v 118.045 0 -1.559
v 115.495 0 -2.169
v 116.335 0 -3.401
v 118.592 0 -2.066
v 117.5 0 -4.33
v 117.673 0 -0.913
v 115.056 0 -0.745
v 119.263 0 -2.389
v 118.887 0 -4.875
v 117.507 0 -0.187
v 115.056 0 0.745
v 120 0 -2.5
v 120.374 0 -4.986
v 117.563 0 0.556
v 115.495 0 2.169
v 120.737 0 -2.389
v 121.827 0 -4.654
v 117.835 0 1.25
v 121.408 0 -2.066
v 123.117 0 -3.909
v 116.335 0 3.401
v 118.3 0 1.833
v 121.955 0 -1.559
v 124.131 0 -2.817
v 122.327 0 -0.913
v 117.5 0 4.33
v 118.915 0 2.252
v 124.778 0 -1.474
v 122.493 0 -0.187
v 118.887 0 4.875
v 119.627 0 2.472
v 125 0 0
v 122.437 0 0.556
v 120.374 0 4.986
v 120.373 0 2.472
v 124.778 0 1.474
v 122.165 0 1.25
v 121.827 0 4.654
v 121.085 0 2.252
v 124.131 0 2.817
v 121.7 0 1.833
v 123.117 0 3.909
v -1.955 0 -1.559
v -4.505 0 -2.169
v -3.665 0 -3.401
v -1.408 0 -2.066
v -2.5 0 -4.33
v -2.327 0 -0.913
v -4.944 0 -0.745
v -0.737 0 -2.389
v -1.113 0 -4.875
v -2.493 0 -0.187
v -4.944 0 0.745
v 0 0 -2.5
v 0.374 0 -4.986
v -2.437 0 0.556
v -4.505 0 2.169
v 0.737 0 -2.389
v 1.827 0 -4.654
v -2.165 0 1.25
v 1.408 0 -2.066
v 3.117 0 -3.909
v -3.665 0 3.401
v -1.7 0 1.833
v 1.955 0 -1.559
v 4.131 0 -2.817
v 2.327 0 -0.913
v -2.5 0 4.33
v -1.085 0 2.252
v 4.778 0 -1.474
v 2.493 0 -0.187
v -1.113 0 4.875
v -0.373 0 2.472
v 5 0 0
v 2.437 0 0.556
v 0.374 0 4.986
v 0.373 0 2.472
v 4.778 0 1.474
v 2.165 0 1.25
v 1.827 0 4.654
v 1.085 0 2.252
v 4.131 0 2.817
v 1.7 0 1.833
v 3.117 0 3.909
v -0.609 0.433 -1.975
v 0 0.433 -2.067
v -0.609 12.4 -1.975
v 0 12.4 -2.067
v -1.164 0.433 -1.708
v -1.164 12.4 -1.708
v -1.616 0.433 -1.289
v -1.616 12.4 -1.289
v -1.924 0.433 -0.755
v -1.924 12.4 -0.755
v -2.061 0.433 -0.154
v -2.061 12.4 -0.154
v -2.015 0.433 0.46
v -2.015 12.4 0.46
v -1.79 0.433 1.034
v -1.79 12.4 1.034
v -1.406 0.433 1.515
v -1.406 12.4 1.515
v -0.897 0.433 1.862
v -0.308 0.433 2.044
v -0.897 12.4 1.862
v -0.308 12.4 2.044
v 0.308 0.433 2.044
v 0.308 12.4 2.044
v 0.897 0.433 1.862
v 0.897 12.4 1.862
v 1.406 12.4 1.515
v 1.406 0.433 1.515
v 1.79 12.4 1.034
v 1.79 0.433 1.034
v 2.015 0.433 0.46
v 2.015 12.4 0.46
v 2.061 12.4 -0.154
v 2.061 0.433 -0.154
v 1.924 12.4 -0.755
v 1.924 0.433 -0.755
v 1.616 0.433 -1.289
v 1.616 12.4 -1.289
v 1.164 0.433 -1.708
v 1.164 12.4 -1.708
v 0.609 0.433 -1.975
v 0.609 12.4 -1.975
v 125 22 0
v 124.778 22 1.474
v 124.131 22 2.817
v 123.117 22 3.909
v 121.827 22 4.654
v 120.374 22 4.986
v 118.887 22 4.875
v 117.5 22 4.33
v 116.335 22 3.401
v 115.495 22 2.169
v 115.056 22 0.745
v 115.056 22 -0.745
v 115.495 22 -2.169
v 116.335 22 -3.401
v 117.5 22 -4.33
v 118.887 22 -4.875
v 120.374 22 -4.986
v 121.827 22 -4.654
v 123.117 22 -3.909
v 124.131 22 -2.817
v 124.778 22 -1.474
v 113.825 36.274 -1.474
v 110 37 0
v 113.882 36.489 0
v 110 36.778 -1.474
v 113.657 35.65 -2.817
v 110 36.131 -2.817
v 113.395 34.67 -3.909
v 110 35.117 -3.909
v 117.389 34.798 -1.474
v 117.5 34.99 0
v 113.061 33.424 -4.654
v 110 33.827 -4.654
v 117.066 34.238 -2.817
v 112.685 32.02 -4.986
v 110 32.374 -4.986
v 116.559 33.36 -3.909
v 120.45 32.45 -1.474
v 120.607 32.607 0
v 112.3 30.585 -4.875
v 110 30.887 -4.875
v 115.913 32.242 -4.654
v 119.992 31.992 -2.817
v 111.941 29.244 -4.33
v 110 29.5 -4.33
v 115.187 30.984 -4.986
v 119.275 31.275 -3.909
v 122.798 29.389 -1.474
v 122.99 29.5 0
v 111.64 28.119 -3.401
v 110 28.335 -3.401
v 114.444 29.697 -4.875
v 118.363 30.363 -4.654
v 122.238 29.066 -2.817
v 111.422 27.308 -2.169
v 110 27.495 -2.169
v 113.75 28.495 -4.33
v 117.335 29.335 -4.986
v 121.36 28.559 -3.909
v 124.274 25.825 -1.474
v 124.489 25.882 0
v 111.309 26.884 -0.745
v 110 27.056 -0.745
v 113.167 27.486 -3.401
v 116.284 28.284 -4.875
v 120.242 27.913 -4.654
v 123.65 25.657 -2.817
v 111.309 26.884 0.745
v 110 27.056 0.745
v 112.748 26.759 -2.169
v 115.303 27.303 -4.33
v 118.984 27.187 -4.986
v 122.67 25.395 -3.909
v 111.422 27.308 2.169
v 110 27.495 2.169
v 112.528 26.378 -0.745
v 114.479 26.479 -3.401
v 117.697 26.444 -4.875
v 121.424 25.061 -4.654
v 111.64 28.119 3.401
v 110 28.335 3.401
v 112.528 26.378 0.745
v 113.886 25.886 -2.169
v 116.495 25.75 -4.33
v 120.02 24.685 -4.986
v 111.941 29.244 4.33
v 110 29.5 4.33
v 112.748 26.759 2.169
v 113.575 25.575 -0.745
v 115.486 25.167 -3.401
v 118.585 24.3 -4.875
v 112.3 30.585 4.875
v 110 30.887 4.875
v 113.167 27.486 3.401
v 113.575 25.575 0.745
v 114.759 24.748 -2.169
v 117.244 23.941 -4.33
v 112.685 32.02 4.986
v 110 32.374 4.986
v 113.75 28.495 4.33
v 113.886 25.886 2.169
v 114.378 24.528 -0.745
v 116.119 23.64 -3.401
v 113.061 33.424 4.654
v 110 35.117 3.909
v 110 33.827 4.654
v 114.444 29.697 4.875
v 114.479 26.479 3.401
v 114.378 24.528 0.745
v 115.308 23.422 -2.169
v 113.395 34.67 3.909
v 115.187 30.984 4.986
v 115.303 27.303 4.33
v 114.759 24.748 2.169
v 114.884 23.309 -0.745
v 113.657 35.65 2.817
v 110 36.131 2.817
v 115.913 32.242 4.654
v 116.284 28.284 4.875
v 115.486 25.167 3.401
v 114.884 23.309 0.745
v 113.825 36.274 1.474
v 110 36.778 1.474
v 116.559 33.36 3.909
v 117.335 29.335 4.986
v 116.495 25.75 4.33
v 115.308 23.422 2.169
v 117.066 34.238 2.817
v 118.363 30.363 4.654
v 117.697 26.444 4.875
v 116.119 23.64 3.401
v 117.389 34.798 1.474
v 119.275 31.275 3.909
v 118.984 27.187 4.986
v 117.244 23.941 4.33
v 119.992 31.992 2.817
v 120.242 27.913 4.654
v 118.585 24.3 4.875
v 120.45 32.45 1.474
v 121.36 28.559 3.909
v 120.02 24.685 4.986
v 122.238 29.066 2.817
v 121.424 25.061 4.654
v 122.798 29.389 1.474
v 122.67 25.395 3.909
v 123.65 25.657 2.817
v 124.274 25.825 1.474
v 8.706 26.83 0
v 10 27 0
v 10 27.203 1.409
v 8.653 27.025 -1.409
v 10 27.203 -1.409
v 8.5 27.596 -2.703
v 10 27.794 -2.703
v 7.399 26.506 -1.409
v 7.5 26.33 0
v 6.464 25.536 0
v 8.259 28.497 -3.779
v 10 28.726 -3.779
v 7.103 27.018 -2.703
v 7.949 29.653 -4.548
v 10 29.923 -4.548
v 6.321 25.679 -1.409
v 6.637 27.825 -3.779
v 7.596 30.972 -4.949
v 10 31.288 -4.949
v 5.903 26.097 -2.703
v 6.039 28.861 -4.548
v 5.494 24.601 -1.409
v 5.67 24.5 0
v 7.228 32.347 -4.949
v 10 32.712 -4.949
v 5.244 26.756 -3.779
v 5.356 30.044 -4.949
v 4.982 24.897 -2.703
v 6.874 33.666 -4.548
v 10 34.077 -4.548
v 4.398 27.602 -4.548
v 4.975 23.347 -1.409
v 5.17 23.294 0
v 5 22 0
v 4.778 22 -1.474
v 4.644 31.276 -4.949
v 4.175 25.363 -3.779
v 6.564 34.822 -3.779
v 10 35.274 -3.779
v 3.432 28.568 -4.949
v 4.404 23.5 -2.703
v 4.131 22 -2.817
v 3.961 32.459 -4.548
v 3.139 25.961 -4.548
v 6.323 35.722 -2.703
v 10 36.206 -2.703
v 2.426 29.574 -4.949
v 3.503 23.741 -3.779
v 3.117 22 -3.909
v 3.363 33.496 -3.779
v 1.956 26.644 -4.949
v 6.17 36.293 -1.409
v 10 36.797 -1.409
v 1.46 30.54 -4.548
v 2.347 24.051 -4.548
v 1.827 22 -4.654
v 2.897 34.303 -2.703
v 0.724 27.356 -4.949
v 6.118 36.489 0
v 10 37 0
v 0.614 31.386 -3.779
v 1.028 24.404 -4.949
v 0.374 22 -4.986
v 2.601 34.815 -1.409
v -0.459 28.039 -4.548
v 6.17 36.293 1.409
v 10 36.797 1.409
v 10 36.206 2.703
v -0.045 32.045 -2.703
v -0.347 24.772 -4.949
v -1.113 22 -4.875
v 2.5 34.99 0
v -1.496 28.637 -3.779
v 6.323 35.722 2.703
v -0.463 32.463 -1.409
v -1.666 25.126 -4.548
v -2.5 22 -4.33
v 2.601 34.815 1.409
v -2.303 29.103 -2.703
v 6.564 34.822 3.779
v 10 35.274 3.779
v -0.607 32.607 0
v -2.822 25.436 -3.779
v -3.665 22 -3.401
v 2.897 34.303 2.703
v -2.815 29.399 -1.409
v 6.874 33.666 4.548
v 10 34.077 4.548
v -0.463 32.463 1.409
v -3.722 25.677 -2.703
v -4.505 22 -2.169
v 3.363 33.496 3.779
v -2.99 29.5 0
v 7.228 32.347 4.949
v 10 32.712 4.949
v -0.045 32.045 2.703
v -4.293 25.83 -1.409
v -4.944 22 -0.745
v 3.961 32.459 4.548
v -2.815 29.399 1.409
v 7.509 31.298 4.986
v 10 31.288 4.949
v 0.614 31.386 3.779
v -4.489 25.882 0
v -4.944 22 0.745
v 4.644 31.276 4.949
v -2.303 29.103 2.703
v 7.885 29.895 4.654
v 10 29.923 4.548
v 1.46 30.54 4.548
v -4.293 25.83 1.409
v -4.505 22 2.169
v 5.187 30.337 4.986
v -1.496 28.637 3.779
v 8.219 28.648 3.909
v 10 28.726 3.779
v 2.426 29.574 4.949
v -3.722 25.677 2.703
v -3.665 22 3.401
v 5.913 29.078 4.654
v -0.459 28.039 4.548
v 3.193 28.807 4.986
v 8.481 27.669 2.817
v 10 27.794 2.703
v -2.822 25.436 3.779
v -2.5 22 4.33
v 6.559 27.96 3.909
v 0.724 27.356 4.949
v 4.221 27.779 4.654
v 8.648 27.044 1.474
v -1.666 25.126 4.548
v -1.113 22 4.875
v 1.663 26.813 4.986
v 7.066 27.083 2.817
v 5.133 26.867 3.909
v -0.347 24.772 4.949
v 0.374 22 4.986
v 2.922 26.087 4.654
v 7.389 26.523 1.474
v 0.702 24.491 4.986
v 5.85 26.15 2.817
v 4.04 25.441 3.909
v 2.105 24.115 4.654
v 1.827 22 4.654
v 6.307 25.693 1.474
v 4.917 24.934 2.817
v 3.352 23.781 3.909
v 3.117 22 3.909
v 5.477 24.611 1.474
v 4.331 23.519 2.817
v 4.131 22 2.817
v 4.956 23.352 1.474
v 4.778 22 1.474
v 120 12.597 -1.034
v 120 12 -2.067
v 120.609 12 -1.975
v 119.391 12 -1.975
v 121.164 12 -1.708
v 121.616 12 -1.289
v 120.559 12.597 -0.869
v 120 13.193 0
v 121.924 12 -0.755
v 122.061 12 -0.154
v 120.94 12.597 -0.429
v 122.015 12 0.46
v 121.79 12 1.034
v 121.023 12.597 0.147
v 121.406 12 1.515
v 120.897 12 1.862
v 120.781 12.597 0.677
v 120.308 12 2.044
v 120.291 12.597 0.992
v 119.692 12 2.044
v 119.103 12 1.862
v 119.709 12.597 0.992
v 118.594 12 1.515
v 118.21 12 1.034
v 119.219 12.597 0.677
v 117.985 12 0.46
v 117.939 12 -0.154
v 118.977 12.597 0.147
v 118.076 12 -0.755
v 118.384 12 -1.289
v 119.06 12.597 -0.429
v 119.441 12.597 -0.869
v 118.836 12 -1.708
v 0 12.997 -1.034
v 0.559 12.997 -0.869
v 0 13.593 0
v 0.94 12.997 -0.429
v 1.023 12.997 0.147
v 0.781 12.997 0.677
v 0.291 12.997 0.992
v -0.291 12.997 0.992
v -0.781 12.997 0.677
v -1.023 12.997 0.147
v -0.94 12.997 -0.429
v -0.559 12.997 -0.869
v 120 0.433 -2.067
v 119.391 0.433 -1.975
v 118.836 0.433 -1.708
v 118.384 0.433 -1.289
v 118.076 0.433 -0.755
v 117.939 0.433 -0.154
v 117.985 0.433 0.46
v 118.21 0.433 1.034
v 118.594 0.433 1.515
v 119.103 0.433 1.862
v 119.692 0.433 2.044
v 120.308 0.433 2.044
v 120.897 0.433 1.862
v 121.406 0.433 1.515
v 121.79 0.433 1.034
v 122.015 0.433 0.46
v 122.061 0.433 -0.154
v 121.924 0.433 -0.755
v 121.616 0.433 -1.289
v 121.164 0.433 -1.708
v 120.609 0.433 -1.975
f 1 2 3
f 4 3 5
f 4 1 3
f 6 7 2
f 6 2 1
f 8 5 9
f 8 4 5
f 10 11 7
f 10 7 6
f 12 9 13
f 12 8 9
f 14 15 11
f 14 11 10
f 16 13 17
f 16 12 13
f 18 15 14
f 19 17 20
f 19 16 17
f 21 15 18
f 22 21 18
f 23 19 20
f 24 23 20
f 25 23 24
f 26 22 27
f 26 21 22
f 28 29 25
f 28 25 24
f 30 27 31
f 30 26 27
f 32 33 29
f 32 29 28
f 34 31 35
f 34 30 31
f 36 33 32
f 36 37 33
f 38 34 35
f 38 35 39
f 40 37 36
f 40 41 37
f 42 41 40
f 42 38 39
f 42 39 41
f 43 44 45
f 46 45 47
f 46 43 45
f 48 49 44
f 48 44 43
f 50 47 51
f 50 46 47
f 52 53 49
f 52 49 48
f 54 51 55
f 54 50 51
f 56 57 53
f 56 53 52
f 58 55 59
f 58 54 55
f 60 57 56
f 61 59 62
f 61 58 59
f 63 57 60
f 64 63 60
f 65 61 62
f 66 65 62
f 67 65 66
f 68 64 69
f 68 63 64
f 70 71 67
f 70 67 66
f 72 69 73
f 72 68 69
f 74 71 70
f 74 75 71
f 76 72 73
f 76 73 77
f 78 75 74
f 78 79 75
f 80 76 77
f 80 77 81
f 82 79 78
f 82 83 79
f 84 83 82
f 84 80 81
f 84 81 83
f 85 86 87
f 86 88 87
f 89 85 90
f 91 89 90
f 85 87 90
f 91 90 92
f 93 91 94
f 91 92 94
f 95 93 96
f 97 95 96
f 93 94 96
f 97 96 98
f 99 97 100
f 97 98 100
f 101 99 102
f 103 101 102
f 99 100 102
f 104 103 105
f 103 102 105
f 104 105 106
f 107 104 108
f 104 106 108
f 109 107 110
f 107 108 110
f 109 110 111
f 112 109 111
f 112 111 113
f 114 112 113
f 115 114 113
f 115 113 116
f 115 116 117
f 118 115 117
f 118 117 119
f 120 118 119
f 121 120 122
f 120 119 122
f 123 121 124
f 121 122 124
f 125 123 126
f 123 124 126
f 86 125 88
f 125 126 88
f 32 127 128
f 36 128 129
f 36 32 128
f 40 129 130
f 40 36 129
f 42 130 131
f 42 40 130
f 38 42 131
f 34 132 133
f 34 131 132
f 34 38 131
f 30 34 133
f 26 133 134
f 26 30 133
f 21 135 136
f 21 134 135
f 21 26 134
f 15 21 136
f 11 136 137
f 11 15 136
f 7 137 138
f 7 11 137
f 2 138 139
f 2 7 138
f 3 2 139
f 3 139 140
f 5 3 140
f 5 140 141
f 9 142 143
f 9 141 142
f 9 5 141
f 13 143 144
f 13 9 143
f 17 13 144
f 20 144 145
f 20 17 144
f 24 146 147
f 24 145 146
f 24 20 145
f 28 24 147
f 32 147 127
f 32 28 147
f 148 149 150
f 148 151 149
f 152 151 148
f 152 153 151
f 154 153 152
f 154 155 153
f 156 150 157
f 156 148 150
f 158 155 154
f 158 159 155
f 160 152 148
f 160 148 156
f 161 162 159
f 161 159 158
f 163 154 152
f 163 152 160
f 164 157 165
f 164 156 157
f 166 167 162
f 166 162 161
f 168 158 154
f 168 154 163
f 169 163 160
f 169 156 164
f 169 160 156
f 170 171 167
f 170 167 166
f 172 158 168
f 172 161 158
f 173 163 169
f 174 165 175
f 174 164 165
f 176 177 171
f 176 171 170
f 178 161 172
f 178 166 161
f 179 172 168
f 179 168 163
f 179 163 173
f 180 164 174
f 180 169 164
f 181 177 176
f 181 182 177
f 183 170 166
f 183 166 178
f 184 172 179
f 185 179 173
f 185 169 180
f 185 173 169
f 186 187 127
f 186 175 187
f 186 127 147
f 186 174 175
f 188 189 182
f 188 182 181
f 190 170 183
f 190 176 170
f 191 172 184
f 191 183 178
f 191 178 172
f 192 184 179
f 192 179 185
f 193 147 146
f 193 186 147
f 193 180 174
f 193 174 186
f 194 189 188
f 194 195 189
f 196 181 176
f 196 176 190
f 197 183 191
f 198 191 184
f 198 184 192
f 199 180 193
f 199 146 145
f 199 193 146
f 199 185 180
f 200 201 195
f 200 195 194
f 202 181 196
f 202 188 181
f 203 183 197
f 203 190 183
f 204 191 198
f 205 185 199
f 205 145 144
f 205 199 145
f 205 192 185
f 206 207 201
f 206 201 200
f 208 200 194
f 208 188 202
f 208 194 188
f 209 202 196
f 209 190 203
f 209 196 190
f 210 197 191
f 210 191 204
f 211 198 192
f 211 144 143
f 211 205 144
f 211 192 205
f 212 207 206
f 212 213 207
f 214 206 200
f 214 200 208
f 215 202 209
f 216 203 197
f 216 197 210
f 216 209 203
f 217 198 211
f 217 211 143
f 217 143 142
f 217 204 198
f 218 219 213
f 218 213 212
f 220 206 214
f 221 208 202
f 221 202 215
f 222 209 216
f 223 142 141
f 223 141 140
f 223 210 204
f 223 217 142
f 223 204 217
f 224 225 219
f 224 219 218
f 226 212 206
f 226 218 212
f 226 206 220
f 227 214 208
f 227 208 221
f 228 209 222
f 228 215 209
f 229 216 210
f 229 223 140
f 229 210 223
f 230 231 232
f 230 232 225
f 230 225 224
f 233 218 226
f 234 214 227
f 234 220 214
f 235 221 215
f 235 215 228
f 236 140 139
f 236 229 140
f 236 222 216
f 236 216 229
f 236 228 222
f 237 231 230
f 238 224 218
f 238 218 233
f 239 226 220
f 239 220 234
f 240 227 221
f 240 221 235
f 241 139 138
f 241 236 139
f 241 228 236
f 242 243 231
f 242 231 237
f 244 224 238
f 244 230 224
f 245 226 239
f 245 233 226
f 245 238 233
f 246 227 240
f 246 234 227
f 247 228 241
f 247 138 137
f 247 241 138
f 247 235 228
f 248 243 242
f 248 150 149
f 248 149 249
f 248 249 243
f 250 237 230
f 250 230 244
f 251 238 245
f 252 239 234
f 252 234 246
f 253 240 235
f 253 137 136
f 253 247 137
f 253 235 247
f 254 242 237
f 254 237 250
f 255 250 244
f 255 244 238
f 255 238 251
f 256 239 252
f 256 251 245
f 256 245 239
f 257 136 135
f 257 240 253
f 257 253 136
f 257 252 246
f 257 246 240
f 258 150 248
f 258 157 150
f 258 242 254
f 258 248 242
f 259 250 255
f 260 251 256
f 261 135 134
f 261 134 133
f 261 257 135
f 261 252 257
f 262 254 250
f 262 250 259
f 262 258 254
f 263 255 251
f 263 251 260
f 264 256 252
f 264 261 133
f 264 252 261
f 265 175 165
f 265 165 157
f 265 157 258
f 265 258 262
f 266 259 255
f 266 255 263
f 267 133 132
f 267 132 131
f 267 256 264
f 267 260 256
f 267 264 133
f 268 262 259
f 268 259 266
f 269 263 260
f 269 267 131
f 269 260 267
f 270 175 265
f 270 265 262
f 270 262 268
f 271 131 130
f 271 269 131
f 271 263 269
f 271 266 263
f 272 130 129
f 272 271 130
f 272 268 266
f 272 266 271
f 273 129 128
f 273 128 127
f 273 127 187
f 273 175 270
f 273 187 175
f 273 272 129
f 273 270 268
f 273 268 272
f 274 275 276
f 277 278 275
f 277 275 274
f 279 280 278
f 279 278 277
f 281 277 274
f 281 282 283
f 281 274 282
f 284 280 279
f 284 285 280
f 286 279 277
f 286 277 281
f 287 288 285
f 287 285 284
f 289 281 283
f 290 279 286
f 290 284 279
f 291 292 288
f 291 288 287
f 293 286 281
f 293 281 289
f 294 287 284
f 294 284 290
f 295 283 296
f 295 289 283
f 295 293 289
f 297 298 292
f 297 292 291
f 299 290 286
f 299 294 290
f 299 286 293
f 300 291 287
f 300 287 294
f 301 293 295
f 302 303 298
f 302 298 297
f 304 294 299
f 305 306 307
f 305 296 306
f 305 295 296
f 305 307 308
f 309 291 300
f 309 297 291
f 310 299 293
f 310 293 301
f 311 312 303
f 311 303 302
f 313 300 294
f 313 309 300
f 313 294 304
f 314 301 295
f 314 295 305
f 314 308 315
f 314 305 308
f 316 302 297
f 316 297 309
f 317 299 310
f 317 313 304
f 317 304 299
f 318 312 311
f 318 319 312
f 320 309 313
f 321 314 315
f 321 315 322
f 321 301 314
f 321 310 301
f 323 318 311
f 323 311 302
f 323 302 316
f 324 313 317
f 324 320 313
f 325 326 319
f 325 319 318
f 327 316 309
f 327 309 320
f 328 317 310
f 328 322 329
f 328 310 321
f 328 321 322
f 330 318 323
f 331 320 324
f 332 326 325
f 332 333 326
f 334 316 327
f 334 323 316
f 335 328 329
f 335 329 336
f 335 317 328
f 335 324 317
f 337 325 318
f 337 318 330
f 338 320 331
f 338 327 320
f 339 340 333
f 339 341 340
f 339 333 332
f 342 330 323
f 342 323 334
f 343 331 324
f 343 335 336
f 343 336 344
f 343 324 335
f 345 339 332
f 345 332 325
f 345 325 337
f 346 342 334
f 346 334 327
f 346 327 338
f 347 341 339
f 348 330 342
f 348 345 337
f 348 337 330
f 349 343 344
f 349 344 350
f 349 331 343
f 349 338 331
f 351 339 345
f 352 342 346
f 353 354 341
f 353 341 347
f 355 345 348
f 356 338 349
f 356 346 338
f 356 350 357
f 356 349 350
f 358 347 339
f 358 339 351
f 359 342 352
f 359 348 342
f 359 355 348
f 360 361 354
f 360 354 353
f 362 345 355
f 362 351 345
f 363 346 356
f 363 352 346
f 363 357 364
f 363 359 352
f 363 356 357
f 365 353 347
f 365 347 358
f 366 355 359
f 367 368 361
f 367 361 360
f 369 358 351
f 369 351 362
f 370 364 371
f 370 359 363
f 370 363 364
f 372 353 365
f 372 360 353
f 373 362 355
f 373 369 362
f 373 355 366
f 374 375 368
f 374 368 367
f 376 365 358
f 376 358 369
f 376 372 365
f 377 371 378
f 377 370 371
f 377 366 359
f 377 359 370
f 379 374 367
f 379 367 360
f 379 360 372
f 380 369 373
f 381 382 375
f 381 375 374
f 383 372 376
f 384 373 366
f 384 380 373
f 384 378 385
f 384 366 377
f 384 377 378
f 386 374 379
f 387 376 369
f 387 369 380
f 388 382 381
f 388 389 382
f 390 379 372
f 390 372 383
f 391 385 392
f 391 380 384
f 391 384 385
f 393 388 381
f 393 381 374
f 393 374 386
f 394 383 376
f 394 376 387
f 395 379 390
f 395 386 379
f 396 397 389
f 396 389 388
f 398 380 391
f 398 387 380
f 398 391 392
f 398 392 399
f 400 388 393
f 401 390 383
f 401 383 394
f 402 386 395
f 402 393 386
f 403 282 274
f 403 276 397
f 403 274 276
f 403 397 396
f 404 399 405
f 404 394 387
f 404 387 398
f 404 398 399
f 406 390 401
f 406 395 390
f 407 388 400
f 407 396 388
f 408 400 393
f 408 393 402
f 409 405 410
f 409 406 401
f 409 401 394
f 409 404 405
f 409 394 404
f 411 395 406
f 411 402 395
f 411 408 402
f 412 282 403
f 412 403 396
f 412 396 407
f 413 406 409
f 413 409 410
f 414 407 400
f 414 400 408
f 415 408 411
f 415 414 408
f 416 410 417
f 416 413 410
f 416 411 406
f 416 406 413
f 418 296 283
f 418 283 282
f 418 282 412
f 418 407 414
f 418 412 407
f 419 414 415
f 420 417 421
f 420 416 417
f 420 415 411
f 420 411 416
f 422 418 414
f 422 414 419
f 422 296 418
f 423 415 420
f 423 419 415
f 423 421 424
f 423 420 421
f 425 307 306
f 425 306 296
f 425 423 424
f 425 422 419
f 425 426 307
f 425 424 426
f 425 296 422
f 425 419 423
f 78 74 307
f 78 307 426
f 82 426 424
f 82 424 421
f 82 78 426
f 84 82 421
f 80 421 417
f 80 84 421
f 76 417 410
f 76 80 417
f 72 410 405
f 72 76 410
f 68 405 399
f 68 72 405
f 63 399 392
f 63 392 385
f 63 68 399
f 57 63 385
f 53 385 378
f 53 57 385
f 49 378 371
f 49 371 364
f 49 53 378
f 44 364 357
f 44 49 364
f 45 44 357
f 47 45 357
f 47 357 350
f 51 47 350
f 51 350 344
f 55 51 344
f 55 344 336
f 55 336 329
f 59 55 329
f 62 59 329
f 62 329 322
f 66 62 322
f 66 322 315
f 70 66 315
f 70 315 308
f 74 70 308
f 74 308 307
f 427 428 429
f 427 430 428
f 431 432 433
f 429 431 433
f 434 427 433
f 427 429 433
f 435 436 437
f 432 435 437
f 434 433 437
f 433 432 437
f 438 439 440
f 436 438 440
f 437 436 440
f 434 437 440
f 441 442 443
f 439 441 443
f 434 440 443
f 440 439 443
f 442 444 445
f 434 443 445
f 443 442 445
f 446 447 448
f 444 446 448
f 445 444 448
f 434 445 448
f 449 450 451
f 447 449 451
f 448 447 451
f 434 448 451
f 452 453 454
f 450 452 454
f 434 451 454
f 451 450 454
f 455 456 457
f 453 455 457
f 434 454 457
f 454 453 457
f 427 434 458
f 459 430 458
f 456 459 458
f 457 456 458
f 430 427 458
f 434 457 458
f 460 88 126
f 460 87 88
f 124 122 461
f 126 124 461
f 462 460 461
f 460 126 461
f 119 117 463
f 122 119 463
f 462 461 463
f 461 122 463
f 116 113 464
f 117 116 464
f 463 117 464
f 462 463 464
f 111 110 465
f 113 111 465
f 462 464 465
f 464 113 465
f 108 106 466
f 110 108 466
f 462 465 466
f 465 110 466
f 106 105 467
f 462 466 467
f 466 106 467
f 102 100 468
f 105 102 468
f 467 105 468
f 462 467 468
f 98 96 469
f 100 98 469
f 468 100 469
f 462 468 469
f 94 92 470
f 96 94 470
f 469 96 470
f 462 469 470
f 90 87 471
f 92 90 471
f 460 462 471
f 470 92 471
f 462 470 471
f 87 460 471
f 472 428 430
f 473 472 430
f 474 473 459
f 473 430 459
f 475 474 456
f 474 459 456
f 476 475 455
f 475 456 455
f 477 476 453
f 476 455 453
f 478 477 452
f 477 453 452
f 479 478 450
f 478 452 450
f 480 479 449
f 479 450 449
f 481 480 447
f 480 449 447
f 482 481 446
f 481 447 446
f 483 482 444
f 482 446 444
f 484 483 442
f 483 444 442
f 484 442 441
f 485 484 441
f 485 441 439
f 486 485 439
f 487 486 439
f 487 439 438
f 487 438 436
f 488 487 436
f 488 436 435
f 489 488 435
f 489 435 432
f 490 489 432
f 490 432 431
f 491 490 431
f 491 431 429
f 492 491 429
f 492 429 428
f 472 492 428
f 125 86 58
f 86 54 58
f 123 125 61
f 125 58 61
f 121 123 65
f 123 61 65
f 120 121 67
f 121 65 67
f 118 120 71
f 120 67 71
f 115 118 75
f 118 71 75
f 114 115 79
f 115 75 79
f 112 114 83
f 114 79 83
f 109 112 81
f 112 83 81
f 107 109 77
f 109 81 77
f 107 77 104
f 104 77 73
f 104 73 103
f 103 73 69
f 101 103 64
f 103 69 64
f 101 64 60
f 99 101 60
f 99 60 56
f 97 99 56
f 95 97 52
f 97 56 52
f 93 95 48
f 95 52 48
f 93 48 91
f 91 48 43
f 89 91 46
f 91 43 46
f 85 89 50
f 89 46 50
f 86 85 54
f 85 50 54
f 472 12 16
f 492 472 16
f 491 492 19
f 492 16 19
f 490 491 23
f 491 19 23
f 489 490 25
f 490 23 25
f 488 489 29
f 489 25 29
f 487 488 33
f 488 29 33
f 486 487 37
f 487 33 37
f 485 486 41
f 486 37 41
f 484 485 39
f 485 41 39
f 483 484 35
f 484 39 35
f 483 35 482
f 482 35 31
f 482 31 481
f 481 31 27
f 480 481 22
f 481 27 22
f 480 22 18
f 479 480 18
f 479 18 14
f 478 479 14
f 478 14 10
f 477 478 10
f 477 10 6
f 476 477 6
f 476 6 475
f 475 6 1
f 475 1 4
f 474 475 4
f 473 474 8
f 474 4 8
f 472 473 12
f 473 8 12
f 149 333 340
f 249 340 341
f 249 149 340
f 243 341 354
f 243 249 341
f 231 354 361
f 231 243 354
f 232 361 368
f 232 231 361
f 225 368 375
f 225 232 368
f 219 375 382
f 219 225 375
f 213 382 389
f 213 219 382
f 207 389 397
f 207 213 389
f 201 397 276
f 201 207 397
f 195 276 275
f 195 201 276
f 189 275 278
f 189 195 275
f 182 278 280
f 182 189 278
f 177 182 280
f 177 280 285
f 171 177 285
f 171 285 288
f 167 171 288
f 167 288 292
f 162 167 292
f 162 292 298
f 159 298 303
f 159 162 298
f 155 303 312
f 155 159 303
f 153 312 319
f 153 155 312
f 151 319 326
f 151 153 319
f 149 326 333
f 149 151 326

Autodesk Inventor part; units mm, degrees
sketch "Sketch_1" plane through (0, 0, 0) normal (0, 0, 1) x (1, 0, 0)
  line L0 (0, 0) -> (0, 22)
  line L1 (0, 22) -> (5, 22)
  line L2 (5, 22) -> (5, 0)
  line L3 (5, 0) -> (0, 0)
  line L4 (0, 0) -> (0, 22)
revolve "Revolution1" add sketch "Sketch_1" angle 360 about axis through (0, 0, 0) along (0, -1, 0)
sketch "Sketch_2" plane through (0, 22, 0) normal (0, 1, 0) x (1, 0, 0)
  line L0 (10, 10) -> (10, -10)
  circle A0 centre (0, 0) radius 5
revolve "Revolution2" add sketch "Sketch_2" angle 90 about axis through (10, 22, -10) along (0, 0, -1)
sketch "Sketch3" plane through (0, 0, 0) normal (0, -1, 0) x (1, 0, 0)
  point P0 (0, 0)
hole "Hole1" at (0, 0, 0) direction (0, 1, 0) diameter 4.134 depth 12.4 tip angle 120 countersink diameter 5 countersink angle 90 thread size "M5x0.8" class "6H" standard "ISO Metric profile"
sketch "Sketch_4" plane through (0, 0, 0) normal (0, 0, 1) x (1, 0, 0)
  line L0 (110, 32) -> (10, 32)
  line L1 (10, 32) -> (10, 37)
  line L2 (10, 37) -> (110, 37)
  line L3 (110, 37) -> (110, 32)
  line L4 (110, 32) -> (10, 32)
revolve "Revolution3" add sketch "Sketch_4" angle 360 about axis through (110, 32, 0) along (1, 0, 0)
sketch "Sketch_6" plane through (0, 22, 0) normal (0, 1, 0) x (1, 0, 0)
  line L0 (110, -10) -> (110, 10)
  circle A0 centre (120, 0) radius 5
revolve "Revolution4" add sketch "Sketch_6" angle 90 about axis through (110, 22, 10) along (0, 0, 1)
sketch "Sketch_5" plane through (0, 0, 0) normal (0, 0, 1) x (1, 0, 0)
  line L0 (120, 0) -> (120, 22)
  line L1 (120, 22) -> (125, 22)
  line L2 (125, 22) -> (125, 0)
  line L3 (125, 0) -> (120, 0)
  line L4 (120, 0) -> (120, 22)
revolve "Revolution5" add sketch "Sketch_5" angle 360 about axis through (120, 0, 0) along (0, -1, 0)
sketch "Sketch7" plane through (120, 0, 0) normal (0, -1, 0) x (1, 0, 0)
  point P0 (0, 0)
hole "Hole2" at (120, 0, 0) direction (0, 1, 0) diameter 4.134 depth 12 tip angle 120 countersink diameter 5 countersink angle 90 thread size "M5x0.8" class "6H" standard "ISO Metric profile"
ref_plane "RR_XY" through (60, 32, 0) normal (1, 0, 0) x (0, 0, -1)
ref_plane "RR_YZ" through (60, 32, 0) normal (0, 0, -1) x (0, 1, 0)
ref_plane "RR_ZX" through (60, 32, 0) normal (0, 1, 0) x (1, 0, 0)
ref_plane "U_XY" through (0, 0, 0) normal (0, 1, 0) x (1, 0, 0)
ref_plane "U_YZ" through (0, 0, 0) normal (1, 0, 0) x (0, 0, -1)
ref_plane "U_ZX" through (0, 0, 0) normal (0, 0, -1) x (0, 1, 0)
ref_plane "U1_XY" through (120, 0, 0) normal (0, 1, 0) x (1, 0, 0)
ref_plane "U1_YZ" through (120, 0, 0) normal (1, 0, 0) x (0, 0, -1)
ref_plane "U1_ZX" through (120, 0, 0) normal (0, 0, -1) x (0, 1, 0)
properties part number "UWANK10-120-27" material "鋼、炭素鋼"
